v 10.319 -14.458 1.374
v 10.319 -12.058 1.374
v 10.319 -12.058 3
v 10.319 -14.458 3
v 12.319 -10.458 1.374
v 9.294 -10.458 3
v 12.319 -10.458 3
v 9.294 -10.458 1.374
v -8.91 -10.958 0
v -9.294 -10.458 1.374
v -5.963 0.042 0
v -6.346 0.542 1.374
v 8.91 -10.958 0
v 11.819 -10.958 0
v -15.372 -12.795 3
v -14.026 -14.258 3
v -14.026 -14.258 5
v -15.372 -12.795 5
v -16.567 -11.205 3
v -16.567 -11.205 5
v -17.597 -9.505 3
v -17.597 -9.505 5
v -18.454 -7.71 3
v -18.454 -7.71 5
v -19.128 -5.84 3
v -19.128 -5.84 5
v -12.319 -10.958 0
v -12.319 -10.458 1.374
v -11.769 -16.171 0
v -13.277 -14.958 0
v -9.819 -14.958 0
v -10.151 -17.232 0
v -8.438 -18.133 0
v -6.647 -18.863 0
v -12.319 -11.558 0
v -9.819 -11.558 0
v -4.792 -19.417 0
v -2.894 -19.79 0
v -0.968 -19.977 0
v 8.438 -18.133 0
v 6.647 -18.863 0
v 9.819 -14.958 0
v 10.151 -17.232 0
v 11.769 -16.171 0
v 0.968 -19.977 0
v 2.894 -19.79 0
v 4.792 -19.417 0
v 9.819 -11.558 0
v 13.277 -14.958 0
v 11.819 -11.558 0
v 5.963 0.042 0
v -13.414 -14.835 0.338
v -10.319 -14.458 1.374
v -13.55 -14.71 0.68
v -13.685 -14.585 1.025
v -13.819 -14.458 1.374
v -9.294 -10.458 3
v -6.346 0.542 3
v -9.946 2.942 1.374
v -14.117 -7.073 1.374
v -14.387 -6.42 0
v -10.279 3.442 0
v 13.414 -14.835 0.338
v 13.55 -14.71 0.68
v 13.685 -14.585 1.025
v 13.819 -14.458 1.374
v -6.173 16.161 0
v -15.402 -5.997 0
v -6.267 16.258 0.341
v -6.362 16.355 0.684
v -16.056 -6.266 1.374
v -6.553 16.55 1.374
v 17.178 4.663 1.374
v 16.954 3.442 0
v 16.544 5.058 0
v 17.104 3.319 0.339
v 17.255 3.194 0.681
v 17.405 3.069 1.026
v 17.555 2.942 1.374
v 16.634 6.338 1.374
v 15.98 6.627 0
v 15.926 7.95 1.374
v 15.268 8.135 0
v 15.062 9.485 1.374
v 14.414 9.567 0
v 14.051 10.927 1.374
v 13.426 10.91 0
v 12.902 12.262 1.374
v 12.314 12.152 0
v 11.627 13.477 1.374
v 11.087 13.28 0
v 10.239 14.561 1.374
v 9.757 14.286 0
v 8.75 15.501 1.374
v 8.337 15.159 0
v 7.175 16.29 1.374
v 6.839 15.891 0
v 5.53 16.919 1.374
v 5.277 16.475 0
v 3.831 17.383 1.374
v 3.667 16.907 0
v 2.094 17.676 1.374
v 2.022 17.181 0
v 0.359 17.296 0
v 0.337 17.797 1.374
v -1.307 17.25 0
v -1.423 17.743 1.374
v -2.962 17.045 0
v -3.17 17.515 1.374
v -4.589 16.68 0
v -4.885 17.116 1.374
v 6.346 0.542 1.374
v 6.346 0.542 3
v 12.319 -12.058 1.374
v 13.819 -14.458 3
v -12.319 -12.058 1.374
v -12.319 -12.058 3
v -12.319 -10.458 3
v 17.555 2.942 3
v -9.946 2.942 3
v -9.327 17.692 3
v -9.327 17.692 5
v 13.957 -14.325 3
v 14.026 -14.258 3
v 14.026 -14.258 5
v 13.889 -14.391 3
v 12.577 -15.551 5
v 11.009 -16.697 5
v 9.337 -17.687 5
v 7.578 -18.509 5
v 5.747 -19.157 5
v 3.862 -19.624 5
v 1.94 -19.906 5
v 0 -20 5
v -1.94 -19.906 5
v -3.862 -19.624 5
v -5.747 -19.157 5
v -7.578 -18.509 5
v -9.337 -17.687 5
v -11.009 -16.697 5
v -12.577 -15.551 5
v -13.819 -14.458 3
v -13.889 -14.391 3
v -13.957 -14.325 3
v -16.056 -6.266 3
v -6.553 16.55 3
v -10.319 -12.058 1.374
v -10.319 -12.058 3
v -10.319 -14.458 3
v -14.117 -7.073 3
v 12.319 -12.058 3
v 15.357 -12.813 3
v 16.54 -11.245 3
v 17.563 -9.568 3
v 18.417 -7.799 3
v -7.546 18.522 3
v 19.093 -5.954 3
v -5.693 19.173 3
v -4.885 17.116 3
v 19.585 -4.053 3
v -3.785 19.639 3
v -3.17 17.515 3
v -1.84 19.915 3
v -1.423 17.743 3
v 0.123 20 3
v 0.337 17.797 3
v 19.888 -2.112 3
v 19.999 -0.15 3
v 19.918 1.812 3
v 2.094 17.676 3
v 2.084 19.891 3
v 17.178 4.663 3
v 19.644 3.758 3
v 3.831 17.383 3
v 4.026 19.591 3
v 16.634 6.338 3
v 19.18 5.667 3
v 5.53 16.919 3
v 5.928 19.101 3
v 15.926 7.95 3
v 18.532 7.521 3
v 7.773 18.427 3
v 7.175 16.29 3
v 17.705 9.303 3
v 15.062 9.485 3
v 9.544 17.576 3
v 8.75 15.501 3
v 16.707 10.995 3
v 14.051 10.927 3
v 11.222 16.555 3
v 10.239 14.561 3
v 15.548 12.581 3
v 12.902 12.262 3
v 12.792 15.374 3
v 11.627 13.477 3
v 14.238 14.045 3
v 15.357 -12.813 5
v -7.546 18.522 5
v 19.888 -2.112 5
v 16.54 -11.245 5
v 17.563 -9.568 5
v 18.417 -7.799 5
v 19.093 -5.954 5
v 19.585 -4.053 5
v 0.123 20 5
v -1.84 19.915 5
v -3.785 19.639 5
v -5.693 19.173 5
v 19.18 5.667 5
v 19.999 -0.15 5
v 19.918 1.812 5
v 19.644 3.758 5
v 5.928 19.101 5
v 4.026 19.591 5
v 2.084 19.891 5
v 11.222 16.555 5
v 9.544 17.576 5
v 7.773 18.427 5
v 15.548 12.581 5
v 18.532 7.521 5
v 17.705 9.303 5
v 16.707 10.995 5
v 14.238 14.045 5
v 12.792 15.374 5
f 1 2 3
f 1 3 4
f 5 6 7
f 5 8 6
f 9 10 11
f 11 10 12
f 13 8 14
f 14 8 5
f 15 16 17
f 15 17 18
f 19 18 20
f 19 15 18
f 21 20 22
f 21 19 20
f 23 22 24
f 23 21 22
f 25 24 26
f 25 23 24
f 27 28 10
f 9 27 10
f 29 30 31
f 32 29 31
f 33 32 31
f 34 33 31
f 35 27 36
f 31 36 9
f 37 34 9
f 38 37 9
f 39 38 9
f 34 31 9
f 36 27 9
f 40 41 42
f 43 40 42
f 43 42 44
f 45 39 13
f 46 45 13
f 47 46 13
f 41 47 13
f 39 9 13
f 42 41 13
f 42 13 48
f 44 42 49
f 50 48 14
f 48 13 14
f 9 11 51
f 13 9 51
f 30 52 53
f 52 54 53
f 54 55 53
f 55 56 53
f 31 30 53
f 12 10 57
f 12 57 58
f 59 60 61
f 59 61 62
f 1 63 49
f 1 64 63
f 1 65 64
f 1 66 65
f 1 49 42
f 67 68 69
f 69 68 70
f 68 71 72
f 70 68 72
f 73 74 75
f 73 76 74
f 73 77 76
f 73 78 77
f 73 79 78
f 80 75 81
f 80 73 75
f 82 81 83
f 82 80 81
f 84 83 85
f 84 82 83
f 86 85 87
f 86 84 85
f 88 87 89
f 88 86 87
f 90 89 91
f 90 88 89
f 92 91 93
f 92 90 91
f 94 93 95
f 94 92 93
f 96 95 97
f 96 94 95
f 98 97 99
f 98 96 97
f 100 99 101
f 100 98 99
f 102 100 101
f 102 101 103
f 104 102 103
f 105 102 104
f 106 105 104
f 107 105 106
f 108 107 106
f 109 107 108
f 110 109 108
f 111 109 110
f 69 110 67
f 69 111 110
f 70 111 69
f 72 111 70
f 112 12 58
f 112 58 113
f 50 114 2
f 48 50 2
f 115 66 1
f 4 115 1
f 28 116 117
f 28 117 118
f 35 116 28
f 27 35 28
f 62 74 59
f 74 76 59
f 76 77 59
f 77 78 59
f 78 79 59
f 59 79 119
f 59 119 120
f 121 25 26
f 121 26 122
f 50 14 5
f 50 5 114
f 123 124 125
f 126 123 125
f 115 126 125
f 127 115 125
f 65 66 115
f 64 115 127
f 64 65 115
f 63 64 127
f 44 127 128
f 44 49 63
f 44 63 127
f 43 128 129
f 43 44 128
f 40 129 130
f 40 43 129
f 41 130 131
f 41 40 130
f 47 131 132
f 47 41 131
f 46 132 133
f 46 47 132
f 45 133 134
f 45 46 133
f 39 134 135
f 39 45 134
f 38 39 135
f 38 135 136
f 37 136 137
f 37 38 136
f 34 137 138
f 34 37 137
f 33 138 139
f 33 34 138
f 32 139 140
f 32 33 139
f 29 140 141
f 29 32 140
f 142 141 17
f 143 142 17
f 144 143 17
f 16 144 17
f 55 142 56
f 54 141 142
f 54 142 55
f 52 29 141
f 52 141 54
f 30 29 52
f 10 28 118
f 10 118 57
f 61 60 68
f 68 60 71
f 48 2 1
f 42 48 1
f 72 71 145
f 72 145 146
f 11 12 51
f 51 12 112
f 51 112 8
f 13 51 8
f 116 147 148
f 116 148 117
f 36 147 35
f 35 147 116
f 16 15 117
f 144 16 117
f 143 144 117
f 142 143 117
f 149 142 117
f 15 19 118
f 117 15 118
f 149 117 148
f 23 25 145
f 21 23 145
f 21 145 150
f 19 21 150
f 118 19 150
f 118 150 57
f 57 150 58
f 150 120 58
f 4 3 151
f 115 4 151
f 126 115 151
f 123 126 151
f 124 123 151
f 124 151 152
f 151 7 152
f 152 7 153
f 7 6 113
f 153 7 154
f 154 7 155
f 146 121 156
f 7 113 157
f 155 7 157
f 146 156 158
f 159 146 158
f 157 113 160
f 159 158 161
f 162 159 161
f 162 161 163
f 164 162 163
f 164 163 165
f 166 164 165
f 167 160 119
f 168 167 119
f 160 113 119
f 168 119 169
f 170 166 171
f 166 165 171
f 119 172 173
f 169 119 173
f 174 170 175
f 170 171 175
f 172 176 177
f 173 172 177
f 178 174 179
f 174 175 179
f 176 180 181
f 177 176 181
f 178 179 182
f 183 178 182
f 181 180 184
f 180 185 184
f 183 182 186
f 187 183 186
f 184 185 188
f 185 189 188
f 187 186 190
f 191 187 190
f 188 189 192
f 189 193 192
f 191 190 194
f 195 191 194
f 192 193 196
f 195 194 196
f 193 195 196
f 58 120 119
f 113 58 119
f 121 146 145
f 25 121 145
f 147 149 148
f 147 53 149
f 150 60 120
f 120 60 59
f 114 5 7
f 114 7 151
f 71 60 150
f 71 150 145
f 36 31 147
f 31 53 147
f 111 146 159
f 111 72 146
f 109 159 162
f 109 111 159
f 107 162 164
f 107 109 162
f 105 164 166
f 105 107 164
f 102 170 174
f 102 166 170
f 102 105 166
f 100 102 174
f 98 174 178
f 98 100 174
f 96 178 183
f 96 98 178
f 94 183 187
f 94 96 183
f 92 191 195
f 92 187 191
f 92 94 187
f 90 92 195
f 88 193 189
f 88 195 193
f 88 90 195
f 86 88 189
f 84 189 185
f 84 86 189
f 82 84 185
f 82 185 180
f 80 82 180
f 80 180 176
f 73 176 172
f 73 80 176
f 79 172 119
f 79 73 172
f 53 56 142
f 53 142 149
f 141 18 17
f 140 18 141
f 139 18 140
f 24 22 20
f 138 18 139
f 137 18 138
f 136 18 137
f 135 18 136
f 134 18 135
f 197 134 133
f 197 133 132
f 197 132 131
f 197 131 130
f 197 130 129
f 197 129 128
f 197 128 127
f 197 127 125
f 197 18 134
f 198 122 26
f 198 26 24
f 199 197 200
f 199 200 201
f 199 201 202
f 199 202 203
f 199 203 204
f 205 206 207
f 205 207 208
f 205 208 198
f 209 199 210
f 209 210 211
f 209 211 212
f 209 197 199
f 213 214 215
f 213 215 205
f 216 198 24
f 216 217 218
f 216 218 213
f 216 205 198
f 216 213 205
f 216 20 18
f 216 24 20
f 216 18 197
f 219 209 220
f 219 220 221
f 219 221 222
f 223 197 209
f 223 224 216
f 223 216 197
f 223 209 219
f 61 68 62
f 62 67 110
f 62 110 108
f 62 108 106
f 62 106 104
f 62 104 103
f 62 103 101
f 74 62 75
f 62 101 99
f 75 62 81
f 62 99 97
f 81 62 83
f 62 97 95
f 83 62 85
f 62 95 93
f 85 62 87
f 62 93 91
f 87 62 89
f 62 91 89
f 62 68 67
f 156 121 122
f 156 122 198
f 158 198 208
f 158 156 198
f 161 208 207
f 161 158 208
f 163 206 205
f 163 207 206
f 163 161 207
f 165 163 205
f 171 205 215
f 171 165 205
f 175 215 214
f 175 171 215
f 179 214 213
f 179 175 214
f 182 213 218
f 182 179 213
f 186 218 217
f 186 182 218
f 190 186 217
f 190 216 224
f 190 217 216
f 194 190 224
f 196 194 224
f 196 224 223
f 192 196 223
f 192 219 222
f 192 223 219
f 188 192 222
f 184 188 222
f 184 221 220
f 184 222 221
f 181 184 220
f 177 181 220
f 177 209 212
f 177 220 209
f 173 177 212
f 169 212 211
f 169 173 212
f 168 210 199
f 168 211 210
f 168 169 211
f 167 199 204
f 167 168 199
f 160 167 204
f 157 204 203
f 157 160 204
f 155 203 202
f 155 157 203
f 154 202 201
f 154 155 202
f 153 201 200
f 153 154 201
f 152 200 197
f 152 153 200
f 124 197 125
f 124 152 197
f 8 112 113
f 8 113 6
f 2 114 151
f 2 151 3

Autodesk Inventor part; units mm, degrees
ref_plane "YZ Plane" through (0, 0, 0) normal (1, 0, 0) x (0, 1, 0)
ref_plane "XZ Plane" through (0, 0, 0) normal (0, 1, 0) x (-1, 0, 0)
ref_plane "XY Plane" through (0, 0, 0) normal (0, 0, 1) x (1, 0, 0)
sketch "Эскиз1" plane through (0, 0, 0) normal (0, 0, 1) x (1, 0, 0)
  line L0 (-14.0097, -7.3348) -> (-16.3175, -6.3736)
  line L1 (-16.3175, -6.3736) -> (-14.0097, -7.3348)
  line L2 (17.7899, 2.7423) -> (-9.8124, 2.7423)
  line L3 (-14.0097, -7.3348) -> (-9.8124, 2.7423)
  line L4 (-9.8124, 2.7423) -> (17.7899, 2.7423)
  line L5 (-16.3175, -6.3736) -> (-6.7051, 16.7046)
  line L6 (-16.3175, -6.3736) -> (-6.7051, 16.7046)
  line L7 (-14.0257, -14.2577) -> (-10.5192, -14.2577)
  line L8 (-14.0257, -14.2577) -> (-10.5192, -14.2577)
  line L9 (-10.5192, -14.2577) -> (-10.5192, -12.2577)
  line L10 (-10.5192, -14.2577) -> (-10.5192, -12.2577)
  line L11 (-10.5192, -12.2577) -> (-12.5192, -12.2577)
  line L12 (-10.5192, -12.2577) -> (-12.5192, -12.2577)
  line L13 (-12.5192, -12.2577) -> (-12.5192, -10.2577)
  line L14 (-12.5192, -12.2577) -> (-12.5192, -10.2577)
  line L15 (-12.5192, -10.2577) -> (-9.4474, -10.2577)
  line L16 (-12.5192, -10.2577) -> (-9.4474, -10.2577)
  line L17 (-9.4474, -10.2577) -> (-6.5, 0.7423)
  line L18 (-9.4474, -10.2577) -> (-6.5, 0.7423)
  line L19 (-6.5, 0.7423) -> (6.5, 0.7423)
  line L20 (-6.5, 0.7423) -> (6.5, 0.7423)
  line L21 (9.4474, -10.2577) -> (12.5192, -10.2577)
  line L22 (6.5, 0.7423) -> (9.4474, -10.2577)
  line L23 (9.4474, -10.2577) -> (12.5192, -10.2577)
  line L24 (12.5192, -10.2577) -> (12.5192, -12.2577)
  line L25 (12.5192, -10.2577) -> (12.5192, -12.2577)
  line L26 (10.5192, -12.2577) -> (10.5192, -14.2577)
  line L27 (12.5192, -12.2577) -> (10.5192, -12.2577)
  line L28 (10.5192, -12.2577) -> (10.5192, -14.2577)
  line L29 (10.5192, -14.2577) -> (14.0257, -14.2577)
  arc A0 (17.7899, 2.7423) -> (-6.7051, 16.7046) centre (0, 0) ccw
  arc A1 (17.7899, 2.7423) -> (-6.7051, 16.7046) centre (0, 0) ccw
  arc A2 (17.5551, 2.9423) -> (-6.5528, 16.5499) centre (0, 0) ccw
  line L30 (17.5551, 2.9423) -> (-9.9457, 2.9423)
  line L31 (-14.1174, -7.0733) -> (-9.9457, 2.9423)
  line L32 (-16.056, -6.2659) -> (-6.5528, 16.5499)
  line L33 (-14.1174, -7.0733) -> (-16.056, -6.2659)
  arc A3 (-14.0257, -14.2577) -> (14.0257, -14.2577) centre (0, 0) ccw
  line L34 (13.5283, -14.4577) -> (10.3192, -14.4577)
  line L35 (10.3192, -12.0577) -> (10.3192, -14.4577)
  line L36 (12.3192, -12.0577) -> (10.3192, -12.0577)
  line L37 (12.3192, -10.4577) -> (12.3192, -12.0577)
  line L38 (9.294, -10.4577) -> (12.3192, -10.4577)
  line L39 (6.3465, 0.5423) -> (9.294, -10.4577)
  line L40 (-6.3465, 0.5423) -> (6.3465, 0.5423)
  line L41 (-9.294, -10.4577) -> (-6.3465, 0.5423)
  line L42 (-12.3192, -10.4577) -> (-9.294, -10.4577)
  line L43 (-12.3192, -12.0577) -> (-12.3192, -10.4577)
  line L44 (-10.3192, -12.0577) -> (-12.3192, -12.0577)
  line L45 (-10.3192, -14.4577) -> (-10.3192, -12.0577)
  line L46 (-14.0257, -14.4577) -> (-10.3192, -14.4577)
  line L47 (10.3192, -14.4577) -> (13.8194, -14.4577)
  point P0 (-13.8194, -14.4577)
  dimension "d9" = 0.2
  dimension "d10" = 0.2
  dimension "d11" = 0.2
  dimension "d12" = 0.2
  dimension "d13" = 0.2
  dimension "d15" = 0.2
  dimension "d16" = 0.2
  dimension "d17" = 0.2
  dimension "d18" = 0.2
  dimension "d19" = 0.2
  dimension "d20" = 0.2
  dimension "d21" = 0.2
  dimension "d22" = 0.2
  dimension "d23" = 0.2
  dimension "d24" = 0.2
  dimension "d25" = 0.2
  dimension "d26" = 0.2
  dimension "d27" = 3.5064
  dimension "d28" = 2
  dimension "d29" = 2
  dimension "d30" = 2
  dimension "d31" = 3.0718
  dimension "d32" = 11
  dimension "d33" = 13
  dimension "d34" = 11
  dimension "d35" = 3.0718
  dimension "d36" = 2
  dimension "d37" = 2
  dimension "d38" = 2
  dimension "d39" = 3.5064
  dimension "d40" = 20
  dimension "d41" = 2
  dimension "d42" = 0.2
extrude "Выдавливание1" add sketch "Эскиз1" along normal blind 3 contours L46 L45 L44 L43 L42 L41 L40 L39 L38 L37 L36 L35 L34 L47 A3 | L30 L31 L33 L32 A2
sketch "Эскиз3" plane through (0, 0, 3) normal (0, 0, 1) x (1, 0, 0)
  arc A0 (-19.1284, -5.8399) -> (-9.3269, 17.692) centre (0, 0) ccw
  arc A1 (-14.0257, -14.2577) -> (14.0257, -14.2577) centre (0, 0) ccw projected
  line L0 (-19.1284, -5.8399) -> (-9.3269, 17.692)
  line L1 (-6.5528, 16.5499) -> (-16.056, -6.2659) projected
  dimension "d43" = 3
extrude "Выдавливание3" add sketch "Эскиз3" along normal blind 2
chamfer "Фаска2" distance 0.5 angle 70 5 edges at (3.8047, 2.9423, 0) (8.7496, 15.5011, 0) (-11.3044, 5.142, 0) (-15.0867, -6.6696, 0) (-12.0316, -2.0655, 0) measured on face at (8.027, 4.2106, 0)
chamfer "Фаска3" distance 0.5 angle 70 12 edges at (7.8203, -4.9577, 0) (10.8066, -10.4577, 0) (12.3192, -11.2577, 0) (11.3192, -12.0577, 0) (10.3192, -13.2577, 0) (11.9238, -14.4577, 0) (-12.0693, -14.4577, 0) (-10.3192, -13.2577, 0) (-11.3192, -12.0577, 0) (-10.8066, -10.4577, 0) (-7.8203, -4.9577, 0) (0, 0.5423, 0) measured on face at (-1.9545, -6.8341, 0) measured on face at (1.7704, -6.791, 0) measured on face at (2.1155, -6.791, 0)
properties part number "cap2"
